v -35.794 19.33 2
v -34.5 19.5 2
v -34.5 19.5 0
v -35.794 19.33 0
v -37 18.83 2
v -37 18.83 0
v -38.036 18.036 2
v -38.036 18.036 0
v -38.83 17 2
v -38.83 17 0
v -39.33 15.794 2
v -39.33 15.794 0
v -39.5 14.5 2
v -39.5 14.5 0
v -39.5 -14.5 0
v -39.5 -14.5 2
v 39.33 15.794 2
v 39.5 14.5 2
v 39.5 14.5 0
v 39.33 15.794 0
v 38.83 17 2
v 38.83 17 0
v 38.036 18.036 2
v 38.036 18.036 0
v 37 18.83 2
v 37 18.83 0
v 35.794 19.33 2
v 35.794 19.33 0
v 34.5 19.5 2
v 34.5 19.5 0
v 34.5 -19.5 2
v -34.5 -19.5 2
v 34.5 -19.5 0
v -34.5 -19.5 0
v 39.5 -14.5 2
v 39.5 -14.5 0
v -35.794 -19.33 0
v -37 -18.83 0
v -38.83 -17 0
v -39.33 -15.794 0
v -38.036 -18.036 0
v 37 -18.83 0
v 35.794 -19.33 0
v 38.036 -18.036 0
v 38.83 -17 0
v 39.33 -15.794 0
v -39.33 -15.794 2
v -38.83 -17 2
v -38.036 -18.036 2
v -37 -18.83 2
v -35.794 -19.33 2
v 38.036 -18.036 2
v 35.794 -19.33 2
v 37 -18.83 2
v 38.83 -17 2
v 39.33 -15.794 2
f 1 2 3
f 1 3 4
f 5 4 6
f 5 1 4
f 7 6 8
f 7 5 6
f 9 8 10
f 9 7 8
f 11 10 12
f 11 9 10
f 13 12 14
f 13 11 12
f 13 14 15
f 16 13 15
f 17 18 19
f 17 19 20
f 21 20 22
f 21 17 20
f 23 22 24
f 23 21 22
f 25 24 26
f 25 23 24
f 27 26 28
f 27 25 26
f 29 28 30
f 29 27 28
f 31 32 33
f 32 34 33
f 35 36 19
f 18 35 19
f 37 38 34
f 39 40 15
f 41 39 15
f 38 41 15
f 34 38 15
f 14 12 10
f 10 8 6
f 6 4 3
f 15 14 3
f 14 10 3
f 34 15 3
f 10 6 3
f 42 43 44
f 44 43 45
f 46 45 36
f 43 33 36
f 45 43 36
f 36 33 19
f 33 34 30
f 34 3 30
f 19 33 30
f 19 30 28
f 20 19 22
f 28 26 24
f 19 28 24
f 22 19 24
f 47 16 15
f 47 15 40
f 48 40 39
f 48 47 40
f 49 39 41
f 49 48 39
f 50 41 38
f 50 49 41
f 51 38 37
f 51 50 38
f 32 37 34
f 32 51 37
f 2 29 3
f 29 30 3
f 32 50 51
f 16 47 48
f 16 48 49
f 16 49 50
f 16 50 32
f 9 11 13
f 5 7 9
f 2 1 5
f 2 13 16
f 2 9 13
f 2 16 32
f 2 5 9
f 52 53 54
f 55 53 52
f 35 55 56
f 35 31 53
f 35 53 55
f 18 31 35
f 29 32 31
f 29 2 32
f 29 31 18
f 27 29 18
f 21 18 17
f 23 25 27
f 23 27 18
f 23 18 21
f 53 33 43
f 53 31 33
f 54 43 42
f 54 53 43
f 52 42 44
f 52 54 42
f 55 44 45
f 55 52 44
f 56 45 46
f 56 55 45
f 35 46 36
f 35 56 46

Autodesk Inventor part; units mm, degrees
ref_plane "YZ Plane" through (0, 0, 0) normal (1, 0, 0) x (0, 1, 0)
ref_plane "XZ Plane" through (0, 0, 0) normal (0, 1, 0) x (-1, 0, 0)
ref_plane "XY Plane" through (0, 0, 0) normal (0, 0, 1) x (1, 0, 0)
sketch "Sketch1" plane through (0, 0, 0) normal (0, 0, 1) x (1, 0, 0)
  line L0 (-39.5, -19.5) -> (39.5, -19.5)
  line L1 (39.5, -19.5) -> (39.5, 19.5)
  line L2 (39.5, 19.5) -> (-39.5, 19.5)
  line L3 (-39.5, 19.5) -> (-39.5, -19.5)
  line L4 (-39.5, -19.5) -> (39.5, 19.5) construction
  line L5 (39.5, -19.5) -> (-39.5, 19.5) construction
  point P0 (0, 0)
  dimension "d0" = 79
  dimension "d1" = 39
extrude "Extrusion1" add sketch "Sketch1" along normal blind 2
fillet "Fillet1" radius 5 4 edges at (39.5, -19.5, 1) (39.5, 19.5, 1) (-39.5, 19.5, 1) (-39.5, -19.5, 1)
sketch "Sketch2" plane through (0, 0, 2) normal (0, 0, 1) x (1, 0, 0)
  arc A0 (-39.5, -14.5) -> (-34.5, -19.5) centre (-34.5, -14.5) ccw projected
  line L0 (-34.5, -19.5) -> (34.5, -19.5) projected
  arc A1 (34.5, -19.5) -> (39.5, -14.5) centre (34.5, -14.5) ccw projected
  line L1 (39.5, -14.5) -> (39.5, 14.5) projected
  arc A2 (39.5, 14.5) -> (34.5, 19.5) centre (34.5, 14.5) ccw projected
  line L2 (34.5, 19.5) -> (-34.5, 19.5) projected
  arc A3 (-34.5, 19.5) -> (-39.5, 14.5) centre (-34.5, 14.5) ccw projected
  line L3 (-39.5, 14.5) -> (-39.5, -14.5) projected
  line L4 (-25, 12.3619) -> (25, 12.3619) construction
  line L5 (25, 12.3619) -> (25, -11.0912) construction
  line L6 (25, -11.0912) -> (-25, -11.0912) construction
  line L7 (-25, -11.0912) -> (-25, 12.3619) construction
  point P0 (0, 0)
  dimension "d5" = 50
  dimension "d6" = 79
  dimension "d7" = 14.5
equation "\"d7\" = -0.5 * d5 + 0.5 * d6"
properties part number "FrontLogoWSU"
